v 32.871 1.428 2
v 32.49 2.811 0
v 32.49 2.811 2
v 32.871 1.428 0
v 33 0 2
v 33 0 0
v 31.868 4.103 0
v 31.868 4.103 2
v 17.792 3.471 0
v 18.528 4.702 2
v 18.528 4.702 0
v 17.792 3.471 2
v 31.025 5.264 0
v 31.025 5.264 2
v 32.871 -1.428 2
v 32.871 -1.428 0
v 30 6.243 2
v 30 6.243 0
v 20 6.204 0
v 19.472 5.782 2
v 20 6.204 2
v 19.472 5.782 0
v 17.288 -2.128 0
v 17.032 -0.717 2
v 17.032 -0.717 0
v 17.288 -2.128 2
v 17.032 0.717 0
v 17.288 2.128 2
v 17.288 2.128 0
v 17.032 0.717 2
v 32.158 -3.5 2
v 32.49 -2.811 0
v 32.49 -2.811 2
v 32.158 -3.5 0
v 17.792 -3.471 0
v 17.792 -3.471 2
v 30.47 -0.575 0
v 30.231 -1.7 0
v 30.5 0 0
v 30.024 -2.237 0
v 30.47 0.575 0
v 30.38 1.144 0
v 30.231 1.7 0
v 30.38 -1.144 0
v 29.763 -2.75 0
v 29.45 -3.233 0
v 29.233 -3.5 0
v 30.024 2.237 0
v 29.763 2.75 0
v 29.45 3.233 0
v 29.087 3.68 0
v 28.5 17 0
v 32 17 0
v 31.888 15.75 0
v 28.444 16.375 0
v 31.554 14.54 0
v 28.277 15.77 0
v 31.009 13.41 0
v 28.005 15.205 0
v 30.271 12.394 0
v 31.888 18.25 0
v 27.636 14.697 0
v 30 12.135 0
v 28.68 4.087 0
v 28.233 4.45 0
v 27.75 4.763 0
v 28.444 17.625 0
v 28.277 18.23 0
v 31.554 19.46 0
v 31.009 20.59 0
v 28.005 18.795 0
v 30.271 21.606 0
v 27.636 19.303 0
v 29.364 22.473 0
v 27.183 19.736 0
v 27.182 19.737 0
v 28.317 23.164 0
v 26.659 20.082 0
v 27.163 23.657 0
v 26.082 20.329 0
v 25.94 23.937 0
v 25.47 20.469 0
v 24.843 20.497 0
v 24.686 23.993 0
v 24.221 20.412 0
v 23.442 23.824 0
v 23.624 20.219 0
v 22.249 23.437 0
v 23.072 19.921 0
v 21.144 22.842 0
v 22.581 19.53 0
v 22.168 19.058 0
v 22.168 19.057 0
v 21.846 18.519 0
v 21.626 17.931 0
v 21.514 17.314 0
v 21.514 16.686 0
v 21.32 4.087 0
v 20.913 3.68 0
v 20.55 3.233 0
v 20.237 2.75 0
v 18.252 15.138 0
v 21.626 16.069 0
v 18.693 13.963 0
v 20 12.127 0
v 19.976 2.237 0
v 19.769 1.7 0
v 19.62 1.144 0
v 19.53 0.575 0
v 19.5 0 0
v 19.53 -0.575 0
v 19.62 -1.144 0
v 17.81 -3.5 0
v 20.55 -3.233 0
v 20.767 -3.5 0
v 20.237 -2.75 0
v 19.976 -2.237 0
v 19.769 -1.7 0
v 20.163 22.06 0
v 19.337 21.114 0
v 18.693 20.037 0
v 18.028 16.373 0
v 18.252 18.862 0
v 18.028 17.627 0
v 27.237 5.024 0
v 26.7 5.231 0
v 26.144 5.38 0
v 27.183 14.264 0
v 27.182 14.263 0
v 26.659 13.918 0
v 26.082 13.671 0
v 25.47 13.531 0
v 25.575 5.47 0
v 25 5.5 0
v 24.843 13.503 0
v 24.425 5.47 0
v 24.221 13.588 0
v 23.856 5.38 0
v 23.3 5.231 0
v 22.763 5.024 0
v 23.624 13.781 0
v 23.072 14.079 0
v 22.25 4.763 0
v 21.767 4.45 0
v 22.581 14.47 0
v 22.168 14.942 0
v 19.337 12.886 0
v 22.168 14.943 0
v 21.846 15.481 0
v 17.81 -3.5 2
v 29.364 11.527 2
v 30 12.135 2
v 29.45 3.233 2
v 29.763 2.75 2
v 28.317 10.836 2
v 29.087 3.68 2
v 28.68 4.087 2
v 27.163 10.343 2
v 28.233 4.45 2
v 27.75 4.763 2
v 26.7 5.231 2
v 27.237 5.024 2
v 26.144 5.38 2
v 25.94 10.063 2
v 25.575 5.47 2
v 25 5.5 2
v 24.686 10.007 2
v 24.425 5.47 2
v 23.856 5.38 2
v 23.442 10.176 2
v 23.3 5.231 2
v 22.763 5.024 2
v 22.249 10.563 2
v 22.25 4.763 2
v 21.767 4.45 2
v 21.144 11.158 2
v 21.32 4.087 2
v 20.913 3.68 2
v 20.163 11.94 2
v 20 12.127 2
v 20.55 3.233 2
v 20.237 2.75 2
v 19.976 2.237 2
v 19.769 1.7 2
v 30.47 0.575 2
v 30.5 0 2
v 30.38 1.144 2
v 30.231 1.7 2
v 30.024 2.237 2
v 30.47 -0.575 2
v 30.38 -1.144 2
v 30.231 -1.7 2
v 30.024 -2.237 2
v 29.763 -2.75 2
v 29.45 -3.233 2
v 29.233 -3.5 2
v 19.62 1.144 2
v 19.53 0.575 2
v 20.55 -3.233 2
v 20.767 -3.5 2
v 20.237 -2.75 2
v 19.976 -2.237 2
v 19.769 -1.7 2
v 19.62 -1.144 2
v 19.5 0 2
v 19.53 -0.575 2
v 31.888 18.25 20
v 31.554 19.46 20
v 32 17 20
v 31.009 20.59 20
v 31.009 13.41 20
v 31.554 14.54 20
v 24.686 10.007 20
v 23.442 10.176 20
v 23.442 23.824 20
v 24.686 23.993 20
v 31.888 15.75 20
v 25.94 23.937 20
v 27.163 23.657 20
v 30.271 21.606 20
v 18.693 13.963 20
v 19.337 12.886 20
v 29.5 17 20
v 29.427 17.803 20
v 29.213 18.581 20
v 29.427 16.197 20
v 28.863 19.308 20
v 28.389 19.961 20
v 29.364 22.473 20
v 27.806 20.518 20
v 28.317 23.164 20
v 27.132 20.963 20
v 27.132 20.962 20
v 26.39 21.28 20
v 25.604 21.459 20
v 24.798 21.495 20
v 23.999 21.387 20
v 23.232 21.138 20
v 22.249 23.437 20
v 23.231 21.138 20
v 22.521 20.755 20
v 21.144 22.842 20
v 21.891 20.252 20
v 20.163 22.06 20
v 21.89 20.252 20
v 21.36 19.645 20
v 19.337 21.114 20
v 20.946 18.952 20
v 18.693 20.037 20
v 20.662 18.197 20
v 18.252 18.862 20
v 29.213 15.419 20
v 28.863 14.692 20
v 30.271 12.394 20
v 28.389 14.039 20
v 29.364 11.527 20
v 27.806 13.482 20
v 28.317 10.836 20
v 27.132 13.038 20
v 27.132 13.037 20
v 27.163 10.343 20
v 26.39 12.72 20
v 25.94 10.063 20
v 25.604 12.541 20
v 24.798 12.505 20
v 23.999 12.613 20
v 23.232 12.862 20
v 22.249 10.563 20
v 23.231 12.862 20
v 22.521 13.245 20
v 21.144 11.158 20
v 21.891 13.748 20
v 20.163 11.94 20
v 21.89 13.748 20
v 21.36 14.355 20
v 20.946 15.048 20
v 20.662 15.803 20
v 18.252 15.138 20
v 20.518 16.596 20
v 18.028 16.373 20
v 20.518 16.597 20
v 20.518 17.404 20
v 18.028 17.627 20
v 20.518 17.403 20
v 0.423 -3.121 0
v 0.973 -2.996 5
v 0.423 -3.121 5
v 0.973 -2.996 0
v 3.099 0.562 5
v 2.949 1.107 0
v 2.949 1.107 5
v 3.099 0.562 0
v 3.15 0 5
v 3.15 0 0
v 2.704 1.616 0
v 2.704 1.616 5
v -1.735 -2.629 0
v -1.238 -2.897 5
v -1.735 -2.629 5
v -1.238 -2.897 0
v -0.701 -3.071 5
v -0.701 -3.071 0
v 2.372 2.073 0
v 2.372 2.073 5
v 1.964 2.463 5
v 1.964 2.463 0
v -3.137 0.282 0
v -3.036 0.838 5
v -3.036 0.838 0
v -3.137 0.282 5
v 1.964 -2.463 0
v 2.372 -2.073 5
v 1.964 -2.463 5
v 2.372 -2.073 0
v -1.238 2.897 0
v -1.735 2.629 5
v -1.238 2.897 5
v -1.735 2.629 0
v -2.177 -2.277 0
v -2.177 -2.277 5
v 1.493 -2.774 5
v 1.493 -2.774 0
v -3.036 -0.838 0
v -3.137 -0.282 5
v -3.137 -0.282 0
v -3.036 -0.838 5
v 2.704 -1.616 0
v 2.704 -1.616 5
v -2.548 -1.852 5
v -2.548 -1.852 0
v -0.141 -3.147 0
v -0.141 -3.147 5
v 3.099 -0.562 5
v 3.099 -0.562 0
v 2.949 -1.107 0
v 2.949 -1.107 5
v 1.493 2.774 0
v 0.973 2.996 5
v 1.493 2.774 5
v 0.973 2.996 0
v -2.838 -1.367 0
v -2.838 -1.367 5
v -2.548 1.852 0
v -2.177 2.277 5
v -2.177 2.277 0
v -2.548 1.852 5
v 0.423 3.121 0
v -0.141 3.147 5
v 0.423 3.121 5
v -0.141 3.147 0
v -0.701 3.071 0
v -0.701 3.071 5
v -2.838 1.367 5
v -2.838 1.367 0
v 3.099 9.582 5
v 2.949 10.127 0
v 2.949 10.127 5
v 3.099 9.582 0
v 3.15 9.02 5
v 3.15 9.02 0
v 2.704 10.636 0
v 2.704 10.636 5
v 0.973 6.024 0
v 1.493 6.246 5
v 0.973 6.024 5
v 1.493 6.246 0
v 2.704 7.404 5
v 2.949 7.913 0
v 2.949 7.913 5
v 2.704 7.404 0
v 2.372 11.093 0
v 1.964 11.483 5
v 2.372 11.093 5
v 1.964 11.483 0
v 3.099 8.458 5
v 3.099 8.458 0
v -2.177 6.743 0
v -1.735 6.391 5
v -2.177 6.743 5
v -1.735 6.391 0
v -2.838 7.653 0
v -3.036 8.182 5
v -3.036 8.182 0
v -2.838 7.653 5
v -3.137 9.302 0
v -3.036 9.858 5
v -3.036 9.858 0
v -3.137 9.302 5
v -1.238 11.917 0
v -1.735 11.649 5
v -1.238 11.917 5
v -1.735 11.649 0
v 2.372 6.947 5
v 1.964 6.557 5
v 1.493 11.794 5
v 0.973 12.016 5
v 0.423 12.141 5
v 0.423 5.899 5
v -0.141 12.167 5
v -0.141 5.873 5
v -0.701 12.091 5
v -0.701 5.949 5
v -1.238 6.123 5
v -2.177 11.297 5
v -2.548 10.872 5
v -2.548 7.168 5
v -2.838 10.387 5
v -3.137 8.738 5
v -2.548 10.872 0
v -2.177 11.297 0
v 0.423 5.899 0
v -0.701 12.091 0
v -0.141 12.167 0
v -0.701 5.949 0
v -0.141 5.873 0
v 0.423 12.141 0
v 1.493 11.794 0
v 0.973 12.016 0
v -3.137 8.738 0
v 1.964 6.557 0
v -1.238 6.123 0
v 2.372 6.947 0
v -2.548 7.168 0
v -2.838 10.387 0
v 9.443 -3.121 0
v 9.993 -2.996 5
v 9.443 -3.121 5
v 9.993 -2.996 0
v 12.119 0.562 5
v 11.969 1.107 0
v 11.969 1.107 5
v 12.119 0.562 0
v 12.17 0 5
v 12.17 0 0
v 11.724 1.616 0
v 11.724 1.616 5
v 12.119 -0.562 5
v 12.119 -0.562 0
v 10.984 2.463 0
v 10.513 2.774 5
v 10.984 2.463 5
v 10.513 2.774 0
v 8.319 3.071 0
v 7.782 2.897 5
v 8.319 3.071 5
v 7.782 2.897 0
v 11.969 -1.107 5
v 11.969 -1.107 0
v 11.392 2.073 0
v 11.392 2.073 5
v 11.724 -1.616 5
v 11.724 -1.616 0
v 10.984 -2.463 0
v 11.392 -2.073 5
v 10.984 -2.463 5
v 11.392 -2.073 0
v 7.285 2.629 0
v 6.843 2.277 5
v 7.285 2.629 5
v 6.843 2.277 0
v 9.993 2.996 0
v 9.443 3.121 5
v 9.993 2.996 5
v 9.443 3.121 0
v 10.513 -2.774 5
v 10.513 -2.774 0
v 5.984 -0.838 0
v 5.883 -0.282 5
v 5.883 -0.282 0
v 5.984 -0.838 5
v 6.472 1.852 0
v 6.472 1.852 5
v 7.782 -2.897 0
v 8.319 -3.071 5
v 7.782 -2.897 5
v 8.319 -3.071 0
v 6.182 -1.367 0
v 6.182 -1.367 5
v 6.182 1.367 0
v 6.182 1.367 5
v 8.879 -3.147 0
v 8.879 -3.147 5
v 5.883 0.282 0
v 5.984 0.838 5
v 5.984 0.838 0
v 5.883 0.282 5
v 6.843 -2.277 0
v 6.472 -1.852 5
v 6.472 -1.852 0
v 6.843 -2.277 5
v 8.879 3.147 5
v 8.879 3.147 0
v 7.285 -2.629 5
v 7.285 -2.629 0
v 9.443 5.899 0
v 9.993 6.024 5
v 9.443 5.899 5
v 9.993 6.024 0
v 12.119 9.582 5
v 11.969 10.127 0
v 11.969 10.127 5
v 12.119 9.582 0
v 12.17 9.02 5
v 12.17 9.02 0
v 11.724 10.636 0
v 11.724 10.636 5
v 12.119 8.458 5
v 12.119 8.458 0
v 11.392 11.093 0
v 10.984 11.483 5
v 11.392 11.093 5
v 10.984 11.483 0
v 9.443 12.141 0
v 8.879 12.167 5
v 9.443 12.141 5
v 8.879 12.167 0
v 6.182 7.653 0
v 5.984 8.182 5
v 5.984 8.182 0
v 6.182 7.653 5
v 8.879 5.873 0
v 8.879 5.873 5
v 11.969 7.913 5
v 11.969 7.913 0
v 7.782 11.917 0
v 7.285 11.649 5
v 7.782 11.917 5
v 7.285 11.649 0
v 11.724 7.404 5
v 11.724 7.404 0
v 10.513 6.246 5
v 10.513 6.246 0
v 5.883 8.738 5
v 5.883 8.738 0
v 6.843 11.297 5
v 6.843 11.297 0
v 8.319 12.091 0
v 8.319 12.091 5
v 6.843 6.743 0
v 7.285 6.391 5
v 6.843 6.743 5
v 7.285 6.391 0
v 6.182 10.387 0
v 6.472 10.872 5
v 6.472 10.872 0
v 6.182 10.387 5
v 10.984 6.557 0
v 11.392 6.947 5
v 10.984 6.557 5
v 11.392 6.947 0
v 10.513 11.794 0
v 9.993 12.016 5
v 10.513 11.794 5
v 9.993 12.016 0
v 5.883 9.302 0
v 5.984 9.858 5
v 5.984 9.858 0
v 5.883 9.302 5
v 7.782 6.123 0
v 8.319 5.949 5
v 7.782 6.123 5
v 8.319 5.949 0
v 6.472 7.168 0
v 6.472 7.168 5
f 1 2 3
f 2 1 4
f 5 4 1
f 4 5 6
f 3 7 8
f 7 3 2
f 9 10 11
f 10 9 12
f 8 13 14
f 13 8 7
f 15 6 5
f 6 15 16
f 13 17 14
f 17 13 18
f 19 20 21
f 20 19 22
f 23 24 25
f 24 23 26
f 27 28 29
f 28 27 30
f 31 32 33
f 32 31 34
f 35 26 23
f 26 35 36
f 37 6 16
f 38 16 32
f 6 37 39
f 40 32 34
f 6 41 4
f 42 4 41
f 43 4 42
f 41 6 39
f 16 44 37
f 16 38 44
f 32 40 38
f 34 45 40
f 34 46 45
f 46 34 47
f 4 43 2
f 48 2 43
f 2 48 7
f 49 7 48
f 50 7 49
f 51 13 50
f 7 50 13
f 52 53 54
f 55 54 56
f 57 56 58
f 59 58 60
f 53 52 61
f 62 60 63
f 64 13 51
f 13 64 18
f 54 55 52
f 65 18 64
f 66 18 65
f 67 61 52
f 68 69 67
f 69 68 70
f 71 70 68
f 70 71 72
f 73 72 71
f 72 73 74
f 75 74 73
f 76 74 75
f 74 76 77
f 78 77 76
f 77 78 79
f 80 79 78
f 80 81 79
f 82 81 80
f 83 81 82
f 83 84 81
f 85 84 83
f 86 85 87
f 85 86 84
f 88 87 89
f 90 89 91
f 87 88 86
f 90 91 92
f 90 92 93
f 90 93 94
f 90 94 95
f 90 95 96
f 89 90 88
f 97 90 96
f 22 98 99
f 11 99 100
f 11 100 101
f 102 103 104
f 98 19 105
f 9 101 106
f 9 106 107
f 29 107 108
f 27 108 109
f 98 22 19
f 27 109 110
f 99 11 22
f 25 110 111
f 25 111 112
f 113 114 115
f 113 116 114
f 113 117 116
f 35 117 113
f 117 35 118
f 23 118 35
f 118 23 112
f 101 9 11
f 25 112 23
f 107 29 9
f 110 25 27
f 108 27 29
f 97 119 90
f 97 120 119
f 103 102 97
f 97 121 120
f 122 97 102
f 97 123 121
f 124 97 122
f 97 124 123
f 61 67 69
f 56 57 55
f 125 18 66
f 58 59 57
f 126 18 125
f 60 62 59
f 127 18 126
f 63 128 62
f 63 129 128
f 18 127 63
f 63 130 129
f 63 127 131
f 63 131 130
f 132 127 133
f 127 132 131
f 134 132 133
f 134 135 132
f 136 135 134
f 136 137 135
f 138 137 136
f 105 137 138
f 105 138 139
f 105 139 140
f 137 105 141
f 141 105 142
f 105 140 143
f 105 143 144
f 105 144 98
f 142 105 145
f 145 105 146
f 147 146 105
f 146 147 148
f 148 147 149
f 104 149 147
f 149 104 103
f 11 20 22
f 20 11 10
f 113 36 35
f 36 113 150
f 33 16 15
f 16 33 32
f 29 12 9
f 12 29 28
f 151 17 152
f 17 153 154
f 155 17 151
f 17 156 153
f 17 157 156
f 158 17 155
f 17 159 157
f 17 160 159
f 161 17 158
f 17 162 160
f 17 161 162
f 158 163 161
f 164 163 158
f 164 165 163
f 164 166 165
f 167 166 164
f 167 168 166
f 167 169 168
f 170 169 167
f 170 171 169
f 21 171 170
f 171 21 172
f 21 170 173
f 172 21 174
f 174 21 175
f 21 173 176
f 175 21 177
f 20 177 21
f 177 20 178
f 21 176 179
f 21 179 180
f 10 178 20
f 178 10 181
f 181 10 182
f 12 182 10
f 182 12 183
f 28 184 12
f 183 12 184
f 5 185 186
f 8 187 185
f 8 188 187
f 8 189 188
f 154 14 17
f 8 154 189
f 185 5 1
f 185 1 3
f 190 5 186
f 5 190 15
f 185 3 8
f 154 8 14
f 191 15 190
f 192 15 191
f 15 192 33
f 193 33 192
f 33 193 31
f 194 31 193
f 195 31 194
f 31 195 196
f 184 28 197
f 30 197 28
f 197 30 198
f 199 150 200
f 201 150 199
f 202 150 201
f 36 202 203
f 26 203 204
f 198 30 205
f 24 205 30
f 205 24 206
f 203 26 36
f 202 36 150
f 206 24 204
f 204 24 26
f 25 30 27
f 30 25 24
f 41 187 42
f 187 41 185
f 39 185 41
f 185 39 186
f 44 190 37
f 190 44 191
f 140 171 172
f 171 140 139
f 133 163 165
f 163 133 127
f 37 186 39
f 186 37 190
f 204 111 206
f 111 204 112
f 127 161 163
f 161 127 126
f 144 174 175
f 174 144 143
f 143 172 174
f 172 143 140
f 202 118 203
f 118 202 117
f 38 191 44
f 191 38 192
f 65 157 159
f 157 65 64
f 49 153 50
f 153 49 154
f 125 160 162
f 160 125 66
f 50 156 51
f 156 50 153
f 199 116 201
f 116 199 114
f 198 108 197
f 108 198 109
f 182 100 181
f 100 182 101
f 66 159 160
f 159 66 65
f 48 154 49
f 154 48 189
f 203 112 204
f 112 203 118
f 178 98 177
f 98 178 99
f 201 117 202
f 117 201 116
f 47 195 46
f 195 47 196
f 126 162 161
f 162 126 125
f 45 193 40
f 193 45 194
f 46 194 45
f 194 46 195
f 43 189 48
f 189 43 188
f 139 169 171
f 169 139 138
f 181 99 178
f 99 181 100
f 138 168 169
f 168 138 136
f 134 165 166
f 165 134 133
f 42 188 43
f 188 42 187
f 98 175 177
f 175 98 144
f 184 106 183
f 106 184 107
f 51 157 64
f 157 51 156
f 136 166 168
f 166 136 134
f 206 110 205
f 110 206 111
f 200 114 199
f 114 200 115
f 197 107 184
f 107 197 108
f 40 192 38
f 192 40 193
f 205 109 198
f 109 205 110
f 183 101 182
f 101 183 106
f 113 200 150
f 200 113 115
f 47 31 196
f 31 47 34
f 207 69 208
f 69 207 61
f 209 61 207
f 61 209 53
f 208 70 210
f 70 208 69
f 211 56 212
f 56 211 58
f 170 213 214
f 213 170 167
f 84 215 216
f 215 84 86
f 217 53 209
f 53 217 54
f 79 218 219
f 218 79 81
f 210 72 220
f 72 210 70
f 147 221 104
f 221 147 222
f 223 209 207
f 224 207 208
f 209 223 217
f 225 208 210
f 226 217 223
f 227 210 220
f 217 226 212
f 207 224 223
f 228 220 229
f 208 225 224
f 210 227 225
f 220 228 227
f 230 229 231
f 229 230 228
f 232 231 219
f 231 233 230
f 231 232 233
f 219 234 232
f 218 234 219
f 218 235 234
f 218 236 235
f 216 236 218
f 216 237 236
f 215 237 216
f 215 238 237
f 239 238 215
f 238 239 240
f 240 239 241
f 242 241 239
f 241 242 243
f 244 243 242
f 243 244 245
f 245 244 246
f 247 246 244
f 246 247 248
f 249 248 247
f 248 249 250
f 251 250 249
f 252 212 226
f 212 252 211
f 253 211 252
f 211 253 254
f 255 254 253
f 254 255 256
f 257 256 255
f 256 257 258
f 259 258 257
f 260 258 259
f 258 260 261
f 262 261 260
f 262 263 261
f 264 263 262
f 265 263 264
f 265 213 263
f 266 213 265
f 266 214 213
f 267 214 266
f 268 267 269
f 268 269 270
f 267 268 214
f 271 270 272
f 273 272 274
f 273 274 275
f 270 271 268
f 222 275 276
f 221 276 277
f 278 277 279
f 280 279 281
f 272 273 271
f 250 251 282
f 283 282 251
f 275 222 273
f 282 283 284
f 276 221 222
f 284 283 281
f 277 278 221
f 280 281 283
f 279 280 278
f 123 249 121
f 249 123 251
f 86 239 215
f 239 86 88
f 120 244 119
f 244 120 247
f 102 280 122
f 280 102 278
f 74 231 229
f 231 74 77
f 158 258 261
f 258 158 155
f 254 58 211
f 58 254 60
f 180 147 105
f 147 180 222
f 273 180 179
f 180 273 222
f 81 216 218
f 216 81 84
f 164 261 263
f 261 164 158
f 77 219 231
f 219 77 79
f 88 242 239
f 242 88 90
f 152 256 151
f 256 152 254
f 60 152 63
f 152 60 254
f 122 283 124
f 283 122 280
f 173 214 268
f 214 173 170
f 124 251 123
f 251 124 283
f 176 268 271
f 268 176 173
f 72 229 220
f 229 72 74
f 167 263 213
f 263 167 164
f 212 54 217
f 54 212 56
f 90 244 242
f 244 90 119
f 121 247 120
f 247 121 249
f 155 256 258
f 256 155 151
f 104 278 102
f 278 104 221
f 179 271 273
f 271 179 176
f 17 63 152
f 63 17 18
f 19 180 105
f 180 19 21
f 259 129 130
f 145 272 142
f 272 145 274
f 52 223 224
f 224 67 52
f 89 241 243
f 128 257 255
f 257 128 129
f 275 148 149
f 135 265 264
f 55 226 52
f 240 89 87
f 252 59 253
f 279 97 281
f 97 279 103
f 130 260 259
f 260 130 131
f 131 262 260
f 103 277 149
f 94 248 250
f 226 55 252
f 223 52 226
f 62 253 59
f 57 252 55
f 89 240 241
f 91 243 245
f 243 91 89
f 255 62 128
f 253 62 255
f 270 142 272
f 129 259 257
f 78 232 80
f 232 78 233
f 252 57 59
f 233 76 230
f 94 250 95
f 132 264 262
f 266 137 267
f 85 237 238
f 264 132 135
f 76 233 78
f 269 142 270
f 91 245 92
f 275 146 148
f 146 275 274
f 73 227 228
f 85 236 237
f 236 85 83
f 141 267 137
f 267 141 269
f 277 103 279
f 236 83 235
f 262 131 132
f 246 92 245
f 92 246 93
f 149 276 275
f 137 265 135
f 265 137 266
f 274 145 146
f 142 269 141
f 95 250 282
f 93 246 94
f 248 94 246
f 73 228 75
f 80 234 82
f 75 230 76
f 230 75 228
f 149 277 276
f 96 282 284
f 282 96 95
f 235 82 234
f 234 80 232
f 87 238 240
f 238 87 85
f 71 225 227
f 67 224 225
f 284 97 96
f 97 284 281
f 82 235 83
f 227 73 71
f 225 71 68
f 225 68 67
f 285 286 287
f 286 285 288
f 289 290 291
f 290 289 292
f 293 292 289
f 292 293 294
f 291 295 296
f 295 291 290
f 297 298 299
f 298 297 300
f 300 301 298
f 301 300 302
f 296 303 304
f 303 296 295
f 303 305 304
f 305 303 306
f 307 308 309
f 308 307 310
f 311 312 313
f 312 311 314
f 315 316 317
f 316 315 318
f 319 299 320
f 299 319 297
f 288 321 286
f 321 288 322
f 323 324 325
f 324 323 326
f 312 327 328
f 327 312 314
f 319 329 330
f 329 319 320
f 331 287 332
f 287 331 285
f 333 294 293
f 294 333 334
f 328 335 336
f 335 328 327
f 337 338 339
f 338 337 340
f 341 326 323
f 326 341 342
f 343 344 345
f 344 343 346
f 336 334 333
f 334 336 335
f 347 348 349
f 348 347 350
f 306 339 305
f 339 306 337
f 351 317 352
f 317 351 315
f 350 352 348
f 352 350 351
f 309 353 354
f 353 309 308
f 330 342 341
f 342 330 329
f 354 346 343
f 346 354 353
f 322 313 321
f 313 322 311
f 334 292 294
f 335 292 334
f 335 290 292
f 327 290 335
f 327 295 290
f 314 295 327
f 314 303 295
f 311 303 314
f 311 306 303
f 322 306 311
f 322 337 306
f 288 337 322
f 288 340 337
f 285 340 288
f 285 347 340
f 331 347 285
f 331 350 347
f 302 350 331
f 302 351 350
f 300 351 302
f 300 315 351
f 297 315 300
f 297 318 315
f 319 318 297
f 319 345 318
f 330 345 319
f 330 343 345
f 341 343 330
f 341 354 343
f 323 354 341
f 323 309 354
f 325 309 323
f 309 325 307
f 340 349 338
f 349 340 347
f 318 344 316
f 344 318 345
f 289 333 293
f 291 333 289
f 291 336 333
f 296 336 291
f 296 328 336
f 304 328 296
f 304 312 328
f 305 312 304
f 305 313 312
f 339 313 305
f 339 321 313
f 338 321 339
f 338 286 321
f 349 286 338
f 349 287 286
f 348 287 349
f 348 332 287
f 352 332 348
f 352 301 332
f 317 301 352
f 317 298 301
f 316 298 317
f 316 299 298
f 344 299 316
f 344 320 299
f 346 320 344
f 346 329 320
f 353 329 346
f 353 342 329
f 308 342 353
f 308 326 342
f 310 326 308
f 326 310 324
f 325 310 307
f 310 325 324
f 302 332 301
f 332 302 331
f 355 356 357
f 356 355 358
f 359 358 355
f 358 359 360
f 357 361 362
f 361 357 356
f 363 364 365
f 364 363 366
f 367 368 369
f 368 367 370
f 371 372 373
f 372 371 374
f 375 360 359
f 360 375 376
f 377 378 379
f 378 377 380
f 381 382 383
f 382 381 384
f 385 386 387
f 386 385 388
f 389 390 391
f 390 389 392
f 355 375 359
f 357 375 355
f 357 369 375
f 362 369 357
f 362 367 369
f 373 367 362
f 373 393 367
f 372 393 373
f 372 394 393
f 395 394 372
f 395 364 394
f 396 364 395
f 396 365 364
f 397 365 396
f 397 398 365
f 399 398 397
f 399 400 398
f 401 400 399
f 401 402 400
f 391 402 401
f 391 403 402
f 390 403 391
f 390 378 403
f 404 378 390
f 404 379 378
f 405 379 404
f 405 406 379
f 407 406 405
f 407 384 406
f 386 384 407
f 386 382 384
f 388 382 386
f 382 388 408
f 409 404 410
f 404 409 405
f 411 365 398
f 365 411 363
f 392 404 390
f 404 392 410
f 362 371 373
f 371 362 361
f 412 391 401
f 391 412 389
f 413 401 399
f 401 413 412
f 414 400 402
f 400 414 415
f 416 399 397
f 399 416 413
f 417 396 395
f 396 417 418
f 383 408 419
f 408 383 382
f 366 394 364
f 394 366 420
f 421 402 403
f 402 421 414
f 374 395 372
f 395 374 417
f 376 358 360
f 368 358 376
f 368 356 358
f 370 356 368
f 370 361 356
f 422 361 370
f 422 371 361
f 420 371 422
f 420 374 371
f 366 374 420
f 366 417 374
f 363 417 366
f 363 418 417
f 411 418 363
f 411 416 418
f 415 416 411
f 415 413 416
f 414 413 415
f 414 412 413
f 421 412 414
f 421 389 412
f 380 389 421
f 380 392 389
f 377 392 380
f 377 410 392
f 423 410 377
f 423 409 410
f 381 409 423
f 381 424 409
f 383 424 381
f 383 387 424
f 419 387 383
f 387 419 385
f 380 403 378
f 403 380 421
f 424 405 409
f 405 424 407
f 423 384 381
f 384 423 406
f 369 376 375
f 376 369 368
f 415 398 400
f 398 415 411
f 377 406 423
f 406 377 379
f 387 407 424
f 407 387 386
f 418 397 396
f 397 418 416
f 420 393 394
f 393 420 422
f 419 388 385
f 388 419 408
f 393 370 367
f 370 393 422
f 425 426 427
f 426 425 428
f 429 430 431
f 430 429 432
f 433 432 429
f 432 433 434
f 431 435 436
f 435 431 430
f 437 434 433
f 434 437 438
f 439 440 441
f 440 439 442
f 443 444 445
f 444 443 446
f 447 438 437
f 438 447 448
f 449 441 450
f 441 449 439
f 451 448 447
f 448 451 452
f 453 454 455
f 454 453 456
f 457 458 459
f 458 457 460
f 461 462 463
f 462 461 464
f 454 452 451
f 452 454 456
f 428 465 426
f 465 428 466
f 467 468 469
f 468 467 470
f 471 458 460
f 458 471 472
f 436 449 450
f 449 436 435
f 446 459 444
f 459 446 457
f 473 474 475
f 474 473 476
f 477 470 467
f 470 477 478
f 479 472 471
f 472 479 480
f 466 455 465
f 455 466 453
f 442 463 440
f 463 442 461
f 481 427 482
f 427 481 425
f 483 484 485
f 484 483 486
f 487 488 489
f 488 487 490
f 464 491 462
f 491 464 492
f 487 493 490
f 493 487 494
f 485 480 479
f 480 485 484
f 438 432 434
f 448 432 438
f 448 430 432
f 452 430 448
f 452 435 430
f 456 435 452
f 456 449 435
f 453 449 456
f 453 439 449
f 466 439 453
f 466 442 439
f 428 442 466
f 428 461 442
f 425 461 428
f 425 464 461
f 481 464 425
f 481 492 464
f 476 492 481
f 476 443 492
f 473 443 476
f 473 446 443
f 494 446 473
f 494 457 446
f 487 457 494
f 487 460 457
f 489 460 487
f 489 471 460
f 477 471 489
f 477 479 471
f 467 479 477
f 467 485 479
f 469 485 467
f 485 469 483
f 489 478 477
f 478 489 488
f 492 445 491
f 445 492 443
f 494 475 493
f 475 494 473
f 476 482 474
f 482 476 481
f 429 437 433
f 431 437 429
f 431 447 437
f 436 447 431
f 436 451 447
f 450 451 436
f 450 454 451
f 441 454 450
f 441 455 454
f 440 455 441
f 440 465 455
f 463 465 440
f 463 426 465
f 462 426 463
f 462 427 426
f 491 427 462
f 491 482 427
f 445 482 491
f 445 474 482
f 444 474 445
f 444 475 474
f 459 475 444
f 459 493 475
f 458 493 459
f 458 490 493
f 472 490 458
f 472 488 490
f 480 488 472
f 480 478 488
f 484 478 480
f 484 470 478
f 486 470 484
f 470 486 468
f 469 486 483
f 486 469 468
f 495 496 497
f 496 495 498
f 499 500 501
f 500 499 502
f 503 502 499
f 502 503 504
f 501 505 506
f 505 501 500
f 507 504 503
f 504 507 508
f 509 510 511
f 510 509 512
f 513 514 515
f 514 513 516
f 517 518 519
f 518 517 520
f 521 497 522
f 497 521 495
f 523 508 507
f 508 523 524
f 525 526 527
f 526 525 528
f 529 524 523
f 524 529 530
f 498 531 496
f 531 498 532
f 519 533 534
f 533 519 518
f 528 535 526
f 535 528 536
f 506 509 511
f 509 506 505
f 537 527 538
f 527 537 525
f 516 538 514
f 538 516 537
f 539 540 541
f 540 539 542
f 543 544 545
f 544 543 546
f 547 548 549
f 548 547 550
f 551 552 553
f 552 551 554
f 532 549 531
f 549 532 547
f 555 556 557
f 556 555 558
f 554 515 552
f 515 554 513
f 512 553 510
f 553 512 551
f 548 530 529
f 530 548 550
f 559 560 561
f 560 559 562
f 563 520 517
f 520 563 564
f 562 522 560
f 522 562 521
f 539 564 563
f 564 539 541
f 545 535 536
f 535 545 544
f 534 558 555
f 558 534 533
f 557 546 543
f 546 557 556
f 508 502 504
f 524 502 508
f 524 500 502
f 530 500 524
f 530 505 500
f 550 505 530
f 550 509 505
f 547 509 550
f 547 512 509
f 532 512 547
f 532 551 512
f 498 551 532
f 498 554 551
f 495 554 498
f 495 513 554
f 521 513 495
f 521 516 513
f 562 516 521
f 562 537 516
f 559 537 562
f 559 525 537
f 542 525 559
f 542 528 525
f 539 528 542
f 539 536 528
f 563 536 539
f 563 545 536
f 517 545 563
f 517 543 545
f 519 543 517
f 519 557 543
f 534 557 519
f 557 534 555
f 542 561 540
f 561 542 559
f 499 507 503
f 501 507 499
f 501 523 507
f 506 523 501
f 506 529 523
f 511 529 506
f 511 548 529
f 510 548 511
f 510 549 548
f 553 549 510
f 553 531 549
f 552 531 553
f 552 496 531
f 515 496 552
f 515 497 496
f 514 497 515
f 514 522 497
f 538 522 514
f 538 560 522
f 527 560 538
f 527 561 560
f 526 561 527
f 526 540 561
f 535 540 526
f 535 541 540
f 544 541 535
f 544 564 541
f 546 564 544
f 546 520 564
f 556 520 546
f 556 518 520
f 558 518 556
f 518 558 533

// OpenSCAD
$fn=35;
eps = 0.005;

D_TENON = 6.3/2   ; 
BETWEEN_HOLES = 9.02; 
// grip : 
G_HEIGHT = 2 ;
G_DIA = 16; 
G_INT_DIA = 11; 

// a hole, in witch the top part of a p1000 tip is glued
D_TOP = 9; //  8.76
D_BOTTOM = 7.0 ; 



// la pince
module gripper(){

    // gripp. Ce qui tient le tube : un cylindre évidé et tranché
    difference(){
        cylinder(h= G_HEIGHT, d = G_DIA);        
        
        translate ([0,0,-eps]) cylinder(30, d= 11, $fn = 60);
        translate([-20,-13.5,-eps]) cube([40, 10, 10]);
    }


    translate([0,17,0])
        difference(){
             union(){   
                cylinder(20,7,7);
                    translate([-5,5-16,0])
                 // Intermediate section link bethween gripp and cone adapter
                cube([10,10,G_HEIGHT]);
             }
             // cone adapter
             translate([0,0,-eps])cylinder(20 + 2*eps, d1= D_BOTTOM, d2= D_TOP);
        }   
};

translate([25,0,0]) gripper();

//difference(){

//    translate([-10,-10,-3])cube([20,40,6.9]);
//minkowski() {
//scale([1,1,2])thingie();
 //   	sphere(r = 1);
//}
//}



for (i = [0, 1])
    for (j = [0, 1])
        translate([i * BETWEEN_HOLES, j * BETWEEN_HOLES, 0])
            cylinder(5, D_TENON, D_TENON);
